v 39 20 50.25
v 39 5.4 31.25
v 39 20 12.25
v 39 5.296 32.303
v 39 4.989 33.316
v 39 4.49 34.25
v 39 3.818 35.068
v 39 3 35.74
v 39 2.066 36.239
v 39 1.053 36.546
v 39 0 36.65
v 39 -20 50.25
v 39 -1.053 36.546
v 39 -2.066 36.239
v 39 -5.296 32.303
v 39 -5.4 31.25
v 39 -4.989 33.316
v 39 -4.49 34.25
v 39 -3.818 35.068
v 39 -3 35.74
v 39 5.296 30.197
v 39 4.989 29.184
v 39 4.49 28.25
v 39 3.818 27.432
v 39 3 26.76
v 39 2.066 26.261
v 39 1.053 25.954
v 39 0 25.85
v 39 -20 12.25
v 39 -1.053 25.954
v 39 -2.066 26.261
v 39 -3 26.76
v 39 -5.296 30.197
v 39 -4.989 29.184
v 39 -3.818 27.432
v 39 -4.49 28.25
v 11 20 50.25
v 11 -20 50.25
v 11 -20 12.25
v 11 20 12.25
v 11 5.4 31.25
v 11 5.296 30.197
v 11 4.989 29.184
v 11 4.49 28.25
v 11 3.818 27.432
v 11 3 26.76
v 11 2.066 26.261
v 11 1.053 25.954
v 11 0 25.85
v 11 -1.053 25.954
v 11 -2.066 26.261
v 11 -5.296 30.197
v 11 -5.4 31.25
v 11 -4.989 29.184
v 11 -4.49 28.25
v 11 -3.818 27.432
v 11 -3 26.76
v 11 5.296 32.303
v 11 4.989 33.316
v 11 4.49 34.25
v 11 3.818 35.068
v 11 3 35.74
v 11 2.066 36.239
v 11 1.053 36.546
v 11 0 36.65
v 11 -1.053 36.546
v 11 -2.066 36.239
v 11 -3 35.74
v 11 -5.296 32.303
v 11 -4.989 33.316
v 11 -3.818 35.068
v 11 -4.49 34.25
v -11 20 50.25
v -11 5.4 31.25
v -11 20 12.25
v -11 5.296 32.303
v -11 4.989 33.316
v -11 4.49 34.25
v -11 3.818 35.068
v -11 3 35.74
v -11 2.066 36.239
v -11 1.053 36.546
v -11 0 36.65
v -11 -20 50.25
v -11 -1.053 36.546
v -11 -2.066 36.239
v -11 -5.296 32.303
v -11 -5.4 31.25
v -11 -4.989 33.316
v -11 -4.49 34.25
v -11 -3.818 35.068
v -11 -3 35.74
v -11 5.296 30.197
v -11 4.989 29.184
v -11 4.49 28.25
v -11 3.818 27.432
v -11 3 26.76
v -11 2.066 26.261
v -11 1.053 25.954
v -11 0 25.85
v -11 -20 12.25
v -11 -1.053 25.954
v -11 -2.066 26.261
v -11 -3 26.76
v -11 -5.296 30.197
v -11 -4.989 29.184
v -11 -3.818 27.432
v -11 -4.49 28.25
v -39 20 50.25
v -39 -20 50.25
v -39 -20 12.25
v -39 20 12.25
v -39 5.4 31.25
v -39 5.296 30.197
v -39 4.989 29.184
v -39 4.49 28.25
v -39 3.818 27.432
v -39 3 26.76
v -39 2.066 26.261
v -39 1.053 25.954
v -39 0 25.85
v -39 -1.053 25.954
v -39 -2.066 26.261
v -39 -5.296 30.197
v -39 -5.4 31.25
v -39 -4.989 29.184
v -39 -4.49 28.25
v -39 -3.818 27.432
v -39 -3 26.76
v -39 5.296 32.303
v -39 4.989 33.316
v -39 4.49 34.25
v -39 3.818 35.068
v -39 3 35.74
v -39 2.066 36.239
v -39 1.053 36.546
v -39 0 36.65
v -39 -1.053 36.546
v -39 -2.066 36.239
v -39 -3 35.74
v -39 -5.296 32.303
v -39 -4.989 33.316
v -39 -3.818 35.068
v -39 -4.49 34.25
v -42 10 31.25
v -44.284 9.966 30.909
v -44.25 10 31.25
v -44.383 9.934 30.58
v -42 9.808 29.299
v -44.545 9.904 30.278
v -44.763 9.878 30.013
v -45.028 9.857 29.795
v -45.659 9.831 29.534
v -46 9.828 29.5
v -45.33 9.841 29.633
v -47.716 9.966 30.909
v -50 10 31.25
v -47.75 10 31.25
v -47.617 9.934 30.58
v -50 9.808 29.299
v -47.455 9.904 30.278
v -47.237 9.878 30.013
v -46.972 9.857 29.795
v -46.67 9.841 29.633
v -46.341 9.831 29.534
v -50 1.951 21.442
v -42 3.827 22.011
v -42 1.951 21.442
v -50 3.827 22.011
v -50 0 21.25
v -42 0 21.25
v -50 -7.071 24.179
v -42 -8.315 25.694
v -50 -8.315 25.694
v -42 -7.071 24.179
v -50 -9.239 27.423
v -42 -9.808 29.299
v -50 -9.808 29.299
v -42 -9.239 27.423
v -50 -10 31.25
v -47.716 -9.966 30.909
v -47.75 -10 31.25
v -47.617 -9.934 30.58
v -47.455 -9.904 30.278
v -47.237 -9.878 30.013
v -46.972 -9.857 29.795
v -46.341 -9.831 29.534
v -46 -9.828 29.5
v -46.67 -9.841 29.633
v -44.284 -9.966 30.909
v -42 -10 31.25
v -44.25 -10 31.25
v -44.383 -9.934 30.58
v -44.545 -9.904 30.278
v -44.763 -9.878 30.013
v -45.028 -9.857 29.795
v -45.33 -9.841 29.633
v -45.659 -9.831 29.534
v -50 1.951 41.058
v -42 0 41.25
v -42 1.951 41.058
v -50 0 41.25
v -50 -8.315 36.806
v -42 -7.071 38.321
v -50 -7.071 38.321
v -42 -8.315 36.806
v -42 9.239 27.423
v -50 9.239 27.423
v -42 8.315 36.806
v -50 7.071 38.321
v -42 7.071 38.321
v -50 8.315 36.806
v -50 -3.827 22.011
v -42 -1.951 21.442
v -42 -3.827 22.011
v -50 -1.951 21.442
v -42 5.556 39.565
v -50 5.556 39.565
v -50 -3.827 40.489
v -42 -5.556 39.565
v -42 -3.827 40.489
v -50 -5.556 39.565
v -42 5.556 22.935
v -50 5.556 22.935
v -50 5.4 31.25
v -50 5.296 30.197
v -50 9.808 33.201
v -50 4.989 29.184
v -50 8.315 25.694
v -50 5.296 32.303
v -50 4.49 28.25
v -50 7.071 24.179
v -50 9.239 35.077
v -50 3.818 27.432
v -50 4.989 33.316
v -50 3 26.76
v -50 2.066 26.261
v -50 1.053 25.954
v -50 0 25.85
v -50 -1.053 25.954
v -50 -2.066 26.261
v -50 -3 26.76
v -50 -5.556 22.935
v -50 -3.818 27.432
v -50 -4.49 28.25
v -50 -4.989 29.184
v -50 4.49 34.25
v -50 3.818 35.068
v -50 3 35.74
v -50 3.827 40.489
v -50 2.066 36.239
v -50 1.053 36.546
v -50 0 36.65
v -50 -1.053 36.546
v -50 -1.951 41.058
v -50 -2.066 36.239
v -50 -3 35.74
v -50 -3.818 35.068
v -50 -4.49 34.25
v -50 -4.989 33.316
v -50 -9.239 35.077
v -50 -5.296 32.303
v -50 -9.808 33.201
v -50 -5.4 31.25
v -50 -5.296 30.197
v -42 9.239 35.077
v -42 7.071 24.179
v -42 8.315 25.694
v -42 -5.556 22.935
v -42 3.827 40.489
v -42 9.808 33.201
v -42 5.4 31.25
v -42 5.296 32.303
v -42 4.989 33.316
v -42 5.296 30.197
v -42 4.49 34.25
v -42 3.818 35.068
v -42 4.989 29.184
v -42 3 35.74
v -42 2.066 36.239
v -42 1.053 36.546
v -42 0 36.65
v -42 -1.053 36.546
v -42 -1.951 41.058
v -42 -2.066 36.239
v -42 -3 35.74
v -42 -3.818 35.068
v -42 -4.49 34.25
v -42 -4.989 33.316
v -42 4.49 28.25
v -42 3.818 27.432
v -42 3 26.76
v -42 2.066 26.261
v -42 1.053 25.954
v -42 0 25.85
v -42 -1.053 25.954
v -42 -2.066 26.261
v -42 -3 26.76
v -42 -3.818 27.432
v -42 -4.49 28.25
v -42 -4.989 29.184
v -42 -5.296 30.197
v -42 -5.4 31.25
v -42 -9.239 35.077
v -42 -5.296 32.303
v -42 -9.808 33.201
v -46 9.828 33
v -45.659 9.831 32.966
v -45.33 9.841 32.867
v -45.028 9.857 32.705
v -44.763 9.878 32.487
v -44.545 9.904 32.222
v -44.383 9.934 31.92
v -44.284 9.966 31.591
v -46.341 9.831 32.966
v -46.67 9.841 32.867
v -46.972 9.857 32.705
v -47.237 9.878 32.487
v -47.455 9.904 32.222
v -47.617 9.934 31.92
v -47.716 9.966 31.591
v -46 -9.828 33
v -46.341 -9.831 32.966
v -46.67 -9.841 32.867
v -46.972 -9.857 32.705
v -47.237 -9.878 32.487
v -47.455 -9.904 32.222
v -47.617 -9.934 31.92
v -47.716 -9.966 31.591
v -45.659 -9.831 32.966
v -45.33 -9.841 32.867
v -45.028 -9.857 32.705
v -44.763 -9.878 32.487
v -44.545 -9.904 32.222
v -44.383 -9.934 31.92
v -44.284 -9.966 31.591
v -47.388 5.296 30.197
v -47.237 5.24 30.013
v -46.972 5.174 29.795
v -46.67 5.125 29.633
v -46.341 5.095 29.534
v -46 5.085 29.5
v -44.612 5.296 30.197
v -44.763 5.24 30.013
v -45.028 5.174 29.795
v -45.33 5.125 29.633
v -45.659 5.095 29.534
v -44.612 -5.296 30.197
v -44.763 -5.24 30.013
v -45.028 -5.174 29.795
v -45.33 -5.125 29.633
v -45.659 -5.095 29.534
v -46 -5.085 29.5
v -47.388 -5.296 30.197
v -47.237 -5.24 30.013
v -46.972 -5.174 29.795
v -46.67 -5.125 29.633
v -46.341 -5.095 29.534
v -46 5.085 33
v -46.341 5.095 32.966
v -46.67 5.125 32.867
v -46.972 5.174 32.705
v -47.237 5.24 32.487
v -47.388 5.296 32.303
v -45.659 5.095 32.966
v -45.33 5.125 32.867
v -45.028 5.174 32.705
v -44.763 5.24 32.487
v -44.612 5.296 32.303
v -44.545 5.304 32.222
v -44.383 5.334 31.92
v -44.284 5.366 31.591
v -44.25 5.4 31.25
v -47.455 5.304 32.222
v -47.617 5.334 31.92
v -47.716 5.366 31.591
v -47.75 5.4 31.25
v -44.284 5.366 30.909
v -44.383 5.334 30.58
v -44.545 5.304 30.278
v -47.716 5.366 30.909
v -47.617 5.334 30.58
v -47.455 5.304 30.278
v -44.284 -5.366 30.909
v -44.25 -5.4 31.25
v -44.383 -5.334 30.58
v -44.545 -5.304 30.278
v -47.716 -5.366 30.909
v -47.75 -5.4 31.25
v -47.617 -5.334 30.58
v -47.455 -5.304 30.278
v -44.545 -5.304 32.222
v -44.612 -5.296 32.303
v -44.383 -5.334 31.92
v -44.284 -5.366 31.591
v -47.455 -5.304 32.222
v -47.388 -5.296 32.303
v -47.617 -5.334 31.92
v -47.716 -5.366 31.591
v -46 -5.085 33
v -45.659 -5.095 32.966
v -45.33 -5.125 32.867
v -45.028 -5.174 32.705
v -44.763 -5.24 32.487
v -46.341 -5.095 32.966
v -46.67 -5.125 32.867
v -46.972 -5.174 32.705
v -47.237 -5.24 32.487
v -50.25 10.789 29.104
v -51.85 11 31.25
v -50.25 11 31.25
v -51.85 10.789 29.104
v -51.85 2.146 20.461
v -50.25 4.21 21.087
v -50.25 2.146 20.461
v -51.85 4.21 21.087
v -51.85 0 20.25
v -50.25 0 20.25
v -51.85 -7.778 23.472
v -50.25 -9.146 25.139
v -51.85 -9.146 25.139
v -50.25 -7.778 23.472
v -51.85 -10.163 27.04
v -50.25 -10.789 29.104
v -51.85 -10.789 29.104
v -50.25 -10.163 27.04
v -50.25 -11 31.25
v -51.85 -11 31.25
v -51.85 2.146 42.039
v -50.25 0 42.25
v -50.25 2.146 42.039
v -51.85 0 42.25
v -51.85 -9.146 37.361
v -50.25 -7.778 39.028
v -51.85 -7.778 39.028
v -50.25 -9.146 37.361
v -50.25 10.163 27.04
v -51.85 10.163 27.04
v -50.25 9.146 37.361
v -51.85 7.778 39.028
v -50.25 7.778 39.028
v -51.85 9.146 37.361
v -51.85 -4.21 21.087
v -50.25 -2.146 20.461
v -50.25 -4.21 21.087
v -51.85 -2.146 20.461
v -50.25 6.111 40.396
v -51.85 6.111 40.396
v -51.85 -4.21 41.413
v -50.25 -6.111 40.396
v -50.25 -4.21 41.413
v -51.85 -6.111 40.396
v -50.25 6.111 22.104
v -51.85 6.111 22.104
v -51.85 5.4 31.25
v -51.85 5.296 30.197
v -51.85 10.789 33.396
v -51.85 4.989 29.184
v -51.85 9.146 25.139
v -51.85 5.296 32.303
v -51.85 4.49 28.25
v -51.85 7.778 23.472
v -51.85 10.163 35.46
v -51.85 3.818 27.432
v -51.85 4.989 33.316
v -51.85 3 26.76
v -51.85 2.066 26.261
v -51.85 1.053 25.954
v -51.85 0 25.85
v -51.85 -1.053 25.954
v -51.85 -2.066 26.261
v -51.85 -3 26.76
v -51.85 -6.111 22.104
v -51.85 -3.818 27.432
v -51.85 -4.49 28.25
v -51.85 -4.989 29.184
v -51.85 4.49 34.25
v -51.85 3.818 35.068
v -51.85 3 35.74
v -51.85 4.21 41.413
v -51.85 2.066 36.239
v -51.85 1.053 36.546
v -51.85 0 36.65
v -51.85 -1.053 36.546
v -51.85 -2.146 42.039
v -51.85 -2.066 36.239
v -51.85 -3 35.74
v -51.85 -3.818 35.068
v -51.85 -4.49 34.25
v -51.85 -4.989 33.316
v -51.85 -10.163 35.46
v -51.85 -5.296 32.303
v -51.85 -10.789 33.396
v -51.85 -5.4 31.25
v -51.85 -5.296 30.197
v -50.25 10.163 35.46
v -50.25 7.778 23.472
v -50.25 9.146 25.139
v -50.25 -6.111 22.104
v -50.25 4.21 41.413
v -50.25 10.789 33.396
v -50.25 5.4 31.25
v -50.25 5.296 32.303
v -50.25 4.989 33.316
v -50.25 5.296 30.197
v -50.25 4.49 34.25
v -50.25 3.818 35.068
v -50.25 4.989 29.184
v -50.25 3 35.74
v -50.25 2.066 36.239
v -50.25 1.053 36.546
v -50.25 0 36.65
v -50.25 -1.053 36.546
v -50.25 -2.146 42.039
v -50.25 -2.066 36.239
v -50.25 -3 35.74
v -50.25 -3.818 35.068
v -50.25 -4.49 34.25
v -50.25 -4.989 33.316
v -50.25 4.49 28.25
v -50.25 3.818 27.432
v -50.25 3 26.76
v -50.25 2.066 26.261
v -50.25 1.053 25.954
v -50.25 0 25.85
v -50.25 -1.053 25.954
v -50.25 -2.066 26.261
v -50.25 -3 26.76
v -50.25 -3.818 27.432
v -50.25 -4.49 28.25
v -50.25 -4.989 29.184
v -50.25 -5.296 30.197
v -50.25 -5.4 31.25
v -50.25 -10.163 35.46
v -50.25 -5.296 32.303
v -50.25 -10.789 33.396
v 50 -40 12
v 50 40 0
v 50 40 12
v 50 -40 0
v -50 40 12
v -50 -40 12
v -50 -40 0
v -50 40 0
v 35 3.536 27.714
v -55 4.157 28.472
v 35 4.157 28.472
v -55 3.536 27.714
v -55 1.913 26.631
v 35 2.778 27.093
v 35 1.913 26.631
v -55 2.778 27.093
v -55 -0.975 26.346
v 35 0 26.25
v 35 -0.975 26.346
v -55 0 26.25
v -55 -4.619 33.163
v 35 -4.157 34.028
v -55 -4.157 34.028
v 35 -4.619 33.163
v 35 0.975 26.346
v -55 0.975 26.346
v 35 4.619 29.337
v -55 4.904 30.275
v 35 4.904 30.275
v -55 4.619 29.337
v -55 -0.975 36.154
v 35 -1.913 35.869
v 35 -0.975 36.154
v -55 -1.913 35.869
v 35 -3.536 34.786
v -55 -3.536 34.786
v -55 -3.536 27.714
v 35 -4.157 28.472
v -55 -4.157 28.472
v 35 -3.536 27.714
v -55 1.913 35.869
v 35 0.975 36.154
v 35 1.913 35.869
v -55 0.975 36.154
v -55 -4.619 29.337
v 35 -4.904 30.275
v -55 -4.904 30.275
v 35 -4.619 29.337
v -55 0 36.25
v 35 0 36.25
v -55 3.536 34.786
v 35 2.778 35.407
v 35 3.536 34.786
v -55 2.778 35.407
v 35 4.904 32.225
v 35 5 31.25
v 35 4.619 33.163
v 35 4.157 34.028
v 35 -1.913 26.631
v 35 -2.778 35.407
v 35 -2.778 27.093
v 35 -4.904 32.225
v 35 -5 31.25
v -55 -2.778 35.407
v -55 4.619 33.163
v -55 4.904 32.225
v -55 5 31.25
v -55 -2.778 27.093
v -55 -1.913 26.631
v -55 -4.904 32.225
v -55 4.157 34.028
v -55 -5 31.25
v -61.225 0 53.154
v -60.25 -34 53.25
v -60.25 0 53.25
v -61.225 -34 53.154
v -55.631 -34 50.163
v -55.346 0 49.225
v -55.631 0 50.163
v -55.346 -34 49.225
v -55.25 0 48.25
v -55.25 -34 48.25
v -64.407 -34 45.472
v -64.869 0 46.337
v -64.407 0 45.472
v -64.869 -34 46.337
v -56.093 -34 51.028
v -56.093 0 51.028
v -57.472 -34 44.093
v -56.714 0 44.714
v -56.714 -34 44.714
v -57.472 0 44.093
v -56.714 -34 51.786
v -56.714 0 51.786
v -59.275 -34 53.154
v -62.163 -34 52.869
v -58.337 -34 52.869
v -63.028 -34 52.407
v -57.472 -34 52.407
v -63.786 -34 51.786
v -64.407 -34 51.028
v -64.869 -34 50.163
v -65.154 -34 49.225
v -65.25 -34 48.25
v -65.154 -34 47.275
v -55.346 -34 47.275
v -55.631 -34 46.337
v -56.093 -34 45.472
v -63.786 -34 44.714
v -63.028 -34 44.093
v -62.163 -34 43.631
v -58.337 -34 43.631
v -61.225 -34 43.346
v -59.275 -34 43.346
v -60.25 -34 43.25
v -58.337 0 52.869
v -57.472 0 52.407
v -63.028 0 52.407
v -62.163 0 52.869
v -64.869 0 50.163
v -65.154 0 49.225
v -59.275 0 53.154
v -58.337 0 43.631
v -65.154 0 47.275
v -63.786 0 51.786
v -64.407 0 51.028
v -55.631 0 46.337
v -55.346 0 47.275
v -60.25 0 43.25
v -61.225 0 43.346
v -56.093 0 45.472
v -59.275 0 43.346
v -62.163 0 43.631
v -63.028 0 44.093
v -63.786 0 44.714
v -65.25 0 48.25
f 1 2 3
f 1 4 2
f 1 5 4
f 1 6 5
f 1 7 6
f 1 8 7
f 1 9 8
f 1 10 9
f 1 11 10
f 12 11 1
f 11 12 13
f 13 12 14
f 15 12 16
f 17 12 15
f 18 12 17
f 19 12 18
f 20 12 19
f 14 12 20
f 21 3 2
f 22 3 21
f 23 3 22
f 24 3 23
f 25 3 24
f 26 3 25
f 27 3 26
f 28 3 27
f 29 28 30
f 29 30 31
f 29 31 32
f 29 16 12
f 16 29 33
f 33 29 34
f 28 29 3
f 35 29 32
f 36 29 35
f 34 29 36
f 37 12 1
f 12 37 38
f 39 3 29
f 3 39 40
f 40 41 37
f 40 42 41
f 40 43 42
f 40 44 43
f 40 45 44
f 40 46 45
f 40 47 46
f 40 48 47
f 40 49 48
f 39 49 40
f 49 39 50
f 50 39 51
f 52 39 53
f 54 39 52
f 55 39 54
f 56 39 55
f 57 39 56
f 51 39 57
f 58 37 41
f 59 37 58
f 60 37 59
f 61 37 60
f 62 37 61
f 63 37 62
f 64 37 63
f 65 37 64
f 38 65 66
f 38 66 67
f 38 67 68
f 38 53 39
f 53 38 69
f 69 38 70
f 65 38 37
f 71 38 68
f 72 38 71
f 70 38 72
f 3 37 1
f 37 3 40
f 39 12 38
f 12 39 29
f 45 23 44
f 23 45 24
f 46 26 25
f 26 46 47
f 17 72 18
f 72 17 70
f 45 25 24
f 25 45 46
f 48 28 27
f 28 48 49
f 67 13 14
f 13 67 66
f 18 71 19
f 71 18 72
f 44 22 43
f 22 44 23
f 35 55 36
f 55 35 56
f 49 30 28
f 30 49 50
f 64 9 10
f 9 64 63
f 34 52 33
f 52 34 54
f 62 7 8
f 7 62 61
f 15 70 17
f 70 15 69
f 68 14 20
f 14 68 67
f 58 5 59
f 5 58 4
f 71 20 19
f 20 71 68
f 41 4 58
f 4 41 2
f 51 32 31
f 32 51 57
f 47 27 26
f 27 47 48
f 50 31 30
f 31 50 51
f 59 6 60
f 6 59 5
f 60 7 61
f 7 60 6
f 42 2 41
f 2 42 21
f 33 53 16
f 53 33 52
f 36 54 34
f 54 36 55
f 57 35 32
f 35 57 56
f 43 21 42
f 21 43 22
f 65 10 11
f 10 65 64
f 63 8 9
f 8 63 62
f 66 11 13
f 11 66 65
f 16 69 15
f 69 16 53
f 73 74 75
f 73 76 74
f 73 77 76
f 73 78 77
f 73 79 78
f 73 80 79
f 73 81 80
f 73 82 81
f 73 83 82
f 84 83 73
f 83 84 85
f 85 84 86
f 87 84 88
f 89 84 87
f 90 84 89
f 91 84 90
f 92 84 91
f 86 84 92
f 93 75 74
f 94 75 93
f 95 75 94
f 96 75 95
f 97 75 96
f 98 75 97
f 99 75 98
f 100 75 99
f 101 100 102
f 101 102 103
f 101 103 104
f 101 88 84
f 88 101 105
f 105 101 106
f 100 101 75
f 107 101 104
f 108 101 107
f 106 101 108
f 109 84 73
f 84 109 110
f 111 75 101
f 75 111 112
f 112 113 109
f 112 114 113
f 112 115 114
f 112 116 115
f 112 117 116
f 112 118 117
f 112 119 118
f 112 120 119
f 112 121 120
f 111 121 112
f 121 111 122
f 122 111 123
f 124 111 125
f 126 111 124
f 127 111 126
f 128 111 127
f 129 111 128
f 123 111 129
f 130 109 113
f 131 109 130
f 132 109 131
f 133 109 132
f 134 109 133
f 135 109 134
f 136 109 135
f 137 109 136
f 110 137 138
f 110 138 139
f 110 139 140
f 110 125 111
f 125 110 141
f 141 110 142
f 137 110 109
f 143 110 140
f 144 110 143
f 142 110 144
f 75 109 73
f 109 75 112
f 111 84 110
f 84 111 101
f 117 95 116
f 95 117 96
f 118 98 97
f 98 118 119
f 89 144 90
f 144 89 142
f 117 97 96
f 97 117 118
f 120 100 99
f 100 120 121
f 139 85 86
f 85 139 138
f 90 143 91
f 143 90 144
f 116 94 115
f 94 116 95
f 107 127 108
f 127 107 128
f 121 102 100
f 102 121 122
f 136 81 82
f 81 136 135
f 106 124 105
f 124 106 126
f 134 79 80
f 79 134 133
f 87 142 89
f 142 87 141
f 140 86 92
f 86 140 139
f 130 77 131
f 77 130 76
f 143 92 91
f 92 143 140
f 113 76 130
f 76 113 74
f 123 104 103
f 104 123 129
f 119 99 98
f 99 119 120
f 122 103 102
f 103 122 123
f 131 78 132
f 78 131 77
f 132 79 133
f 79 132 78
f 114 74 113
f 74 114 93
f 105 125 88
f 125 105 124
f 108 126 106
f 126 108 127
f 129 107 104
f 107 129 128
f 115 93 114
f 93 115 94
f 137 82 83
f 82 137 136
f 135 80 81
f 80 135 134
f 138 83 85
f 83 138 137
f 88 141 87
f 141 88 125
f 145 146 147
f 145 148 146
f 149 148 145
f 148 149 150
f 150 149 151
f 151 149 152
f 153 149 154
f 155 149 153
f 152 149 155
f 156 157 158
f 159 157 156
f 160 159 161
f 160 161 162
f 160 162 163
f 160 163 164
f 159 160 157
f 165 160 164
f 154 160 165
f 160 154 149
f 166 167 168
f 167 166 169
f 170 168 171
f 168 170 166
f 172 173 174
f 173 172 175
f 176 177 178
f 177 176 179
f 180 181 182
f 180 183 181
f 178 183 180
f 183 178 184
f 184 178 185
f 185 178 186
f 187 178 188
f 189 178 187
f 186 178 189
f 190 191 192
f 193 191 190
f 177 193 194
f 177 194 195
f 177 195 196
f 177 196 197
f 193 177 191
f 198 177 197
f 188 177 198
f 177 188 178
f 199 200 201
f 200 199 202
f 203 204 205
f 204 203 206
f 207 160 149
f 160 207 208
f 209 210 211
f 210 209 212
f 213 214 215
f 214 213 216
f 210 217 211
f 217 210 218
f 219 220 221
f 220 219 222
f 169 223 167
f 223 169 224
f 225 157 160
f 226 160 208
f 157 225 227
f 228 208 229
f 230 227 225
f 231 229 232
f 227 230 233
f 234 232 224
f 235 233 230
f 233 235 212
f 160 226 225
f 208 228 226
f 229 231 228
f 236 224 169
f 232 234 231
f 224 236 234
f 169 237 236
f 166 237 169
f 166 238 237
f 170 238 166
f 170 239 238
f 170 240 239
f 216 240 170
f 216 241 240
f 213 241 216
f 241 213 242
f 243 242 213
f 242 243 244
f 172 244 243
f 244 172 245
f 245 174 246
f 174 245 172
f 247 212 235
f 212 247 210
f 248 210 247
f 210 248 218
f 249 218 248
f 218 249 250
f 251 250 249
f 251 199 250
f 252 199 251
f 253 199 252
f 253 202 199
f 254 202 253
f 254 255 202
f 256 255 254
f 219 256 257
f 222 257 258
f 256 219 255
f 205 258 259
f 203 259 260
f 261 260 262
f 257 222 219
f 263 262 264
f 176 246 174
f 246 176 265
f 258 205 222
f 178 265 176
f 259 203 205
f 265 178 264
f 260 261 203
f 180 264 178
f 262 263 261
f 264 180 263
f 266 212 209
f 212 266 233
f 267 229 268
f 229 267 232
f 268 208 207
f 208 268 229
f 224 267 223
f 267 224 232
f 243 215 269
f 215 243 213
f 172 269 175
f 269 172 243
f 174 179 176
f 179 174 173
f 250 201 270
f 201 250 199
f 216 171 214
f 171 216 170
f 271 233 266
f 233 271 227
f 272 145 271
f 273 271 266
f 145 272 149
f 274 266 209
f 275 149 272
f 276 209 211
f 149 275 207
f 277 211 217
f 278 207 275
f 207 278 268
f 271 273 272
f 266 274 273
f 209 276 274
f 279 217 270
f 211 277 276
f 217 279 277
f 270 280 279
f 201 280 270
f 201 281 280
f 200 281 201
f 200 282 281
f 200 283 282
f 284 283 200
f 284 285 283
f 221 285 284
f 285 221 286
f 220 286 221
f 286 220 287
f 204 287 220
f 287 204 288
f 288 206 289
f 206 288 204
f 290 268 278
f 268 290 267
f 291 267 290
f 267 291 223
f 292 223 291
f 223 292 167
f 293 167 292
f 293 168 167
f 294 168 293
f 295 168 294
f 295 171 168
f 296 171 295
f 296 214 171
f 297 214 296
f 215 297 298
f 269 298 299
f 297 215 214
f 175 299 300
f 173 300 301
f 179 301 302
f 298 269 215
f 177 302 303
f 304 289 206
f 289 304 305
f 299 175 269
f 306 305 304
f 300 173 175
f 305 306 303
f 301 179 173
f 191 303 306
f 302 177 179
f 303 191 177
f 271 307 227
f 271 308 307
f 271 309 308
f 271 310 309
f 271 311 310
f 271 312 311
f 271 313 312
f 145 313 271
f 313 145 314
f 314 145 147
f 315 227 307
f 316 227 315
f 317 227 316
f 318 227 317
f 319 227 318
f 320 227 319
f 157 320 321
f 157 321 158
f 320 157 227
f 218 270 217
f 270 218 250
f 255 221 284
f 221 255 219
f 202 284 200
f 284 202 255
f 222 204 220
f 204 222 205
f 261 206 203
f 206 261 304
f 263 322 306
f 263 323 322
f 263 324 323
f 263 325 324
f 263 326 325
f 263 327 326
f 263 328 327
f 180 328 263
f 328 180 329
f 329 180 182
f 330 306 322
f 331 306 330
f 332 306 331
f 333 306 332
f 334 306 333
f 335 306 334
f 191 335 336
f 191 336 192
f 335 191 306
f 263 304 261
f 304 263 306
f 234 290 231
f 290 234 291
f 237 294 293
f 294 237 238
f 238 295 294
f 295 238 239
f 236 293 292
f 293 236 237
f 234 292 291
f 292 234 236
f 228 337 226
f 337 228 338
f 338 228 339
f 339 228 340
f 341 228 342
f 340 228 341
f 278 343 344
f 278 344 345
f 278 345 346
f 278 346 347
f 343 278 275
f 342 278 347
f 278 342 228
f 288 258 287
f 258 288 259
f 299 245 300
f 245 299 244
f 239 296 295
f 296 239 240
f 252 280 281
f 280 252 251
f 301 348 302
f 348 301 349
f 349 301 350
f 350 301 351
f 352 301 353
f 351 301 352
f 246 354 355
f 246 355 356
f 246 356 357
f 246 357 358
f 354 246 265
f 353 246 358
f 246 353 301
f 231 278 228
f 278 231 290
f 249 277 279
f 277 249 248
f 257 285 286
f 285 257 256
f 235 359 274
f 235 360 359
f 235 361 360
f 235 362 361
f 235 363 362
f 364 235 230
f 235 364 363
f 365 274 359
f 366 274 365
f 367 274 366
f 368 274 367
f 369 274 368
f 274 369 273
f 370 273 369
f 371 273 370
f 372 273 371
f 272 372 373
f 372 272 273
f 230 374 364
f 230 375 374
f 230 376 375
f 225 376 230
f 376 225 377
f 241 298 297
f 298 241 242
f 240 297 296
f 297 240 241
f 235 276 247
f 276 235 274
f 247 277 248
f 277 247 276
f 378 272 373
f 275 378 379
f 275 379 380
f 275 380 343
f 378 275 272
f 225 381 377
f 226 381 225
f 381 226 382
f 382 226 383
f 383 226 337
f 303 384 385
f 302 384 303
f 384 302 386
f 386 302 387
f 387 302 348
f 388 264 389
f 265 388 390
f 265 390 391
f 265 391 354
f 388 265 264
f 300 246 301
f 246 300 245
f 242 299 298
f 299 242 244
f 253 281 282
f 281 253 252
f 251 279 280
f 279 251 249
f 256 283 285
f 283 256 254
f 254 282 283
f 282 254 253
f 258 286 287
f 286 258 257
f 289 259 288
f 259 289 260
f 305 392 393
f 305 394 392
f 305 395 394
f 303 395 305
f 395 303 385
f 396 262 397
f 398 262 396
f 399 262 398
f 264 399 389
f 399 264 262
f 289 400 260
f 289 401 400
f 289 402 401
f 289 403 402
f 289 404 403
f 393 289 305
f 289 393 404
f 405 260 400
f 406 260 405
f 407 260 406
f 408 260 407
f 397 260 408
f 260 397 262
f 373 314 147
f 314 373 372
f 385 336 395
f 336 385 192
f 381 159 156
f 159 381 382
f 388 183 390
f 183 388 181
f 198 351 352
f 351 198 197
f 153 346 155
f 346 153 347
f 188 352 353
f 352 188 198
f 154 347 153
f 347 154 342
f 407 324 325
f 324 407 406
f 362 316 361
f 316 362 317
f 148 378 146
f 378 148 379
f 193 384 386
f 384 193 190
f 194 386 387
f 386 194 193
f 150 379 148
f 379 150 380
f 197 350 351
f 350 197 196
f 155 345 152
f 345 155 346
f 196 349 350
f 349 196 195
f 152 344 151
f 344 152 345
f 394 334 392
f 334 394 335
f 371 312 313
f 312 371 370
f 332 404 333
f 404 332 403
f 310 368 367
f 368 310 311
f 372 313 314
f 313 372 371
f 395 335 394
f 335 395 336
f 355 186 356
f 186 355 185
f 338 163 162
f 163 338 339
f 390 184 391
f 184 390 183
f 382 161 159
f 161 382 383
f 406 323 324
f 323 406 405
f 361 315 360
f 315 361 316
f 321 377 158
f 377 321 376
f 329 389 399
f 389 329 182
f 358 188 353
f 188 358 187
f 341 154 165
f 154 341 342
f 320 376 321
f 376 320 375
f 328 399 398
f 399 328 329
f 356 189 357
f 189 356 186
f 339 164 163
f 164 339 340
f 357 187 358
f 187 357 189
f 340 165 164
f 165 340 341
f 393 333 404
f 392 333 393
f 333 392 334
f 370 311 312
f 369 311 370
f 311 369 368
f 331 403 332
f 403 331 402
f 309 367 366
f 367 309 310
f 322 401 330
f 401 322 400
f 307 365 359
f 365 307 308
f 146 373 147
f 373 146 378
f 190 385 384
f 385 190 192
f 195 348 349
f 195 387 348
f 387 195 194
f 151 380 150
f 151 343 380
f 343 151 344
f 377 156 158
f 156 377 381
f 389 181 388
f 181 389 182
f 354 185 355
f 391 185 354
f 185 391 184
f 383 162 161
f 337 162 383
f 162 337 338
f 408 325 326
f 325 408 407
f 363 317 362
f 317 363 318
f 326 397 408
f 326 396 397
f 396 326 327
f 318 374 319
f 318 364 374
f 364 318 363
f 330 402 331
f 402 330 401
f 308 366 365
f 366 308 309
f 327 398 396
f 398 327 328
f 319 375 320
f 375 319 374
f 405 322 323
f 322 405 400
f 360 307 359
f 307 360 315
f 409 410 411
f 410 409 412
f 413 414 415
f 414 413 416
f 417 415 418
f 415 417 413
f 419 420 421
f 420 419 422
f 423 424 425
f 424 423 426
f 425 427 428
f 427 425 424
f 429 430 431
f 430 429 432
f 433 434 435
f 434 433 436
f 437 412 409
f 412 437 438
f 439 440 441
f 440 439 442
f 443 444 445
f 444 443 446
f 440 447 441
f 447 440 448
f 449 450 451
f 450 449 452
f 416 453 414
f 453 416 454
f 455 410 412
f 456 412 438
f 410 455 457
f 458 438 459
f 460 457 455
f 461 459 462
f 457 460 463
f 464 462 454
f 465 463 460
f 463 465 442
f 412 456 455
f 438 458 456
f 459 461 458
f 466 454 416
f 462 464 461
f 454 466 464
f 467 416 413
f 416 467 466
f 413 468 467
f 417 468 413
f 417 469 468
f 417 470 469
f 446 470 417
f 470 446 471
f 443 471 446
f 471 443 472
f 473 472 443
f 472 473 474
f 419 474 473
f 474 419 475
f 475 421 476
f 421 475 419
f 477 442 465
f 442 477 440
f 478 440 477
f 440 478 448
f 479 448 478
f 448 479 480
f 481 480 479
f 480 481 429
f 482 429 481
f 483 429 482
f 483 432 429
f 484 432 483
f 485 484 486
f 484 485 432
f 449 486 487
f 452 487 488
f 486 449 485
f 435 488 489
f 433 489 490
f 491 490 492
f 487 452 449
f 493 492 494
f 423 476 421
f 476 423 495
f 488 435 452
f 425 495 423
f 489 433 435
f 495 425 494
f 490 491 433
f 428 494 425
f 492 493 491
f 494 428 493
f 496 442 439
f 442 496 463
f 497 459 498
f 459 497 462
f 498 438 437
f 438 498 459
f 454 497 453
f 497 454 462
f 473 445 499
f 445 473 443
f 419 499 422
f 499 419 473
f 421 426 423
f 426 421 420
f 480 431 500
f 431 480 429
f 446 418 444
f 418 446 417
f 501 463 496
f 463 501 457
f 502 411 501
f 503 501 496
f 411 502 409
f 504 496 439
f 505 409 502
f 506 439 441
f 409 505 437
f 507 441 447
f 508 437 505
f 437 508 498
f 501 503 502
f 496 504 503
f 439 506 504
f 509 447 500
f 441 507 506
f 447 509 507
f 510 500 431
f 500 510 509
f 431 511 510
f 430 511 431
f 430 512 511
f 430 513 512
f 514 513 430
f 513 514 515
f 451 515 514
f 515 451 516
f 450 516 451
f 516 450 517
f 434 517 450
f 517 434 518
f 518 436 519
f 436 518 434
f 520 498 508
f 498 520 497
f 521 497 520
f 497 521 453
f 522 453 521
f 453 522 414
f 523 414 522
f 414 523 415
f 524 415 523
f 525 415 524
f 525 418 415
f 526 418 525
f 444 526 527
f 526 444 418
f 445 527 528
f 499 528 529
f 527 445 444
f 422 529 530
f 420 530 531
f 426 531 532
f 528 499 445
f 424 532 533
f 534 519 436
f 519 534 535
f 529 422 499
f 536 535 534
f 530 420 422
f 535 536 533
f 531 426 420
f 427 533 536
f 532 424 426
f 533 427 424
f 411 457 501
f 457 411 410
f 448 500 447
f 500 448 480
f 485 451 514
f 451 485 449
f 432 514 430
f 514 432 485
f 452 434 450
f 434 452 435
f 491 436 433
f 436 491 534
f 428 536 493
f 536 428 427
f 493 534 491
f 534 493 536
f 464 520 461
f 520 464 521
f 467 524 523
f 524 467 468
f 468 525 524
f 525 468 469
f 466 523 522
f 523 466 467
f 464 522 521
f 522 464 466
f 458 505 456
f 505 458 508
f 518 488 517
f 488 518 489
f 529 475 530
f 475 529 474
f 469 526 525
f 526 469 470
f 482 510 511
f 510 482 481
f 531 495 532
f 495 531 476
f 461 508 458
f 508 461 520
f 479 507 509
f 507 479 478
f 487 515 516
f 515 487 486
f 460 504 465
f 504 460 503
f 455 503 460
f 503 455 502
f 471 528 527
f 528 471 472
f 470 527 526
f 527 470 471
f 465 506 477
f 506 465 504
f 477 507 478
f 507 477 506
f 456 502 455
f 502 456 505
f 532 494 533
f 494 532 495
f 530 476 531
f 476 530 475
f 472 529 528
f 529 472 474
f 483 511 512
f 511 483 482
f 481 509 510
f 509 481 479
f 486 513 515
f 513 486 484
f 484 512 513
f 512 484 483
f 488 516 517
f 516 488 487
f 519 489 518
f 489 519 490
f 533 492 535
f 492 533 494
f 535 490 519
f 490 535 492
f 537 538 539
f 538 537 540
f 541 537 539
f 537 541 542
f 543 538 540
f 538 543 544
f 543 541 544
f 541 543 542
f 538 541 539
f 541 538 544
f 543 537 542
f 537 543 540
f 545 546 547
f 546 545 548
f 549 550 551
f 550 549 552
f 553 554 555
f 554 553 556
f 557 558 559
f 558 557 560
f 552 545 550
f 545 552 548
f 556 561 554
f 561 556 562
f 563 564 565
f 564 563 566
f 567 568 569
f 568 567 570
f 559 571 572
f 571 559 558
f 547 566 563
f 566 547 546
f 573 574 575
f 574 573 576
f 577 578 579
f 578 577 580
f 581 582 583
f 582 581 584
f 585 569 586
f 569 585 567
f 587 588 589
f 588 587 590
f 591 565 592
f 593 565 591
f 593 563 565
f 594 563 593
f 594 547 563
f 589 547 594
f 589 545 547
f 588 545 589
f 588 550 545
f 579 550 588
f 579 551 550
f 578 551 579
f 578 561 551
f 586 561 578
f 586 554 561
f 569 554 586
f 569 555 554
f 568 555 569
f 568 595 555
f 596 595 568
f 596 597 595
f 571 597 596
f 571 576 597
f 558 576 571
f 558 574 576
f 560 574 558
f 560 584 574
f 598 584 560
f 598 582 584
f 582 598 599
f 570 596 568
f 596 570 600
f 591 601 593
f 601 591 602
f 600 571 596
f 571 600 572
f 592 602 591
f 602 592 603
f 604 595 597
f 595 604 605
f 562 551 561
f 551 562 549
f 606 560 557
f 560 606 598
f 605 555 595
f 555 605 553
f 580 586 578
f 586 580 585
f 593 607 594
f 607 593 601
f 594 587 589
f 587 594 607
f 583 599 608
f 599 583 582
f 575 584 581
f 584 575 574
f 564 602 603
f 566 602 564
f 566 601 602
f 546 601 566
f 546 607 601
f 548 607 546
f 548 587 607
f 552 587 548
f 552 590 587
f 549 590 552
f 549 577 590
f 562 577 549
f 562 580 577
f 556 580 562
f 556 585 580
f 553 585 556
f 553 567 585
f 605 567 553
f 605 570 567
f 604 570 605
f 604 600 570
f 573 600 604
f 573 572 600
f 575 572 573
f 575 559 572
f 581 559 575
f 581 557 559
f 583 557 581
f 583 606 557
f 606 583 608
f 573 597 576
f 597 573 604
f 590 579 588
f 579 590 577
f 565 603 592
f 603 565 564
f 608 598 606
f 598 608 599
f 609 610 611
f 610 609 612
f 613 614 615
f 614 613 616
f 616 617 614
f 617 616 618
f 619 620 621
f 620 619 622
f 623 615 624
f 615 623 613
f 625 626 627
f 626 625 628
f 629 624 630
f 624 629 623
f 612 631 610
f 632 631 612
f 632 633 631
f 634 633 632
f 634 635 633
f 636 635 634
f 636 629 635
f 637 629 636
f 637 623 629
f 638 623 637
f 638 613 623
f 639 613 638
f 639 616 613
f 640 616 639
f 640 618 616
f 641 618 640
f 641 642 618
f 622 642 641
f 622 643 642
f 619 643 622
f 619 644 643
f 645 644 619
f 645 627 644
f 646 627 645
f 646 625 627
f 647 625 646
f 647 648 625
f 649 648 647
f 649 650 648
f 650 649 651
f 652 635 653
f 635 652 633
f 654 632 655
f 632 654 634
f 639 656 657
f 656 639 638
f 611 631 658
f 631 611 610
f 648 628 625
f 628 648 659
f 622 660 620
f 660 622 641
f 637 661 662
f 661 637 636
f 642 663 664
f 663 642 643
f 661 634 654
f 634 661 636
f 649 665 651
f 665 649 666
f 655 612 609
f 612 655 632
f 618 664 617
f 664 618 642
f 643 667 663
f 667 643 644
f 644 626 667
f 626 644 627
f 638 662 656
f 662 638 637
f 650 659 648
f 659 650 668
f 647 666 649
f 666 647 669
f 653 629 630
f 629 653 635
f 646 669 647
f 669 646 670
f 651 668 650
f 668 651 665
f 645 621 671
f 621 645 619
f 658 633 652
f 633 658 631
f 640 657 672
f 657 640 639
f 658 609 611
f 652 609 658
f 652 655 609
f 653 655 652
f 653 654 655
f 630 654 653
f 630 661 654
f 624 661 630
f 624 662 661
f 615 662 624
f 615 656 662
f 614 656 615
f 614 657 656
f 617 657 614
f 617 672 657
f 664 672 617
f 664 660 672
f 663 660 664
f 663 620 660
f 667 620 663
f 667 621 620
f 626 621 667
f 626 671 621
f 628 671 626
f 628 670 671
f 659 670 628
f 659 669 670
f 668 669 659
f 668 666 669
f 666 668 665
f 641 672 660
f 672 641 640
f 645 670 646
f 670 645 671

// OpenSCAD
$fn = 32;

// ------------------------------------------------------------------------
// Machine vise: screw d10, jaws 28 x 38 mm
// Every part is its own module, assembly() places every instance.
// ------------------------------------------------------------------------

// --- part 1 ---
module vise_bed() {
  difference() {
    translate([-50, -40, 0]) cube([100, 80, 12]);
  }
}

// --- part 2 ---
module vise_jaw() {
  difference() {
    translate([-14, -20, 0]) cube([28, 40, 38]);
    translate([0, 0, 19]) rotate([0, 90, 0]) cylinder(h = 30, d = 10.8, center = true);
  }
}

// --- part 3 ---
module vise_screw() {
  translate([0, 0, -45]) cylinder(h = 90, d = 10);
}

// --- part 4 ---
module screw_collar() {
  difference() {
    cylinder(h = 8, d = 20);
    translate([0, 0, -1]) cylinder(h = 10, d = 10.8);
    translate([0, 0, 4]) rotate([90, 0, 0]) cylinder(h = 22, d = 3.5, center = true);
  }
}

// --- part 5 ---
module screw_washer() {
  difference() {
      translate([0, 0, 0]) cylinder(h = 1.6, d = 22);
      translate([0, 0, -1]) cylinder(h = 3.6, d = 10.8);
    }
}

// --- part 6 ---
module vise_handle() {
  cylinder(h = 34, d = 10);
}

// --- assembly ---
module assembly() {
  color([0.80, 0.24, 0.20]) translate([0, 0, 0]) rotate([0, 0, 0]) vise_bed();
  color([0.20, 0.45, 0.75]) translate([25, 0, 12.25]) rotate([0, 0, 0]) vise_jaw();
  color([0.25, 0.62, 0.32]) translate([-25, 0, 12.25]) rotate([0, 0, 0]) vise_jaw();
  color([0.92, 0.70, 0.18]) translate([-10, 0, 31.25]) rotate([0, 90, 0]) vise_screw();
  color([0.58, 0.35, 0.70]) translate([-50, 0, 31.25]) rotate([0, 90, 0]) screw_collar();
  color([0.16, 0.66, 0.66]) translate([-51.85, 0, 31.25]) rotate([0, 90, 0]) screw_washer();
  color([0.85, 0.48, 0.18]) translate([-60.25, 0, 48.25]) rotate([90, 0, 0]) vise_handle();
}

assembly();
